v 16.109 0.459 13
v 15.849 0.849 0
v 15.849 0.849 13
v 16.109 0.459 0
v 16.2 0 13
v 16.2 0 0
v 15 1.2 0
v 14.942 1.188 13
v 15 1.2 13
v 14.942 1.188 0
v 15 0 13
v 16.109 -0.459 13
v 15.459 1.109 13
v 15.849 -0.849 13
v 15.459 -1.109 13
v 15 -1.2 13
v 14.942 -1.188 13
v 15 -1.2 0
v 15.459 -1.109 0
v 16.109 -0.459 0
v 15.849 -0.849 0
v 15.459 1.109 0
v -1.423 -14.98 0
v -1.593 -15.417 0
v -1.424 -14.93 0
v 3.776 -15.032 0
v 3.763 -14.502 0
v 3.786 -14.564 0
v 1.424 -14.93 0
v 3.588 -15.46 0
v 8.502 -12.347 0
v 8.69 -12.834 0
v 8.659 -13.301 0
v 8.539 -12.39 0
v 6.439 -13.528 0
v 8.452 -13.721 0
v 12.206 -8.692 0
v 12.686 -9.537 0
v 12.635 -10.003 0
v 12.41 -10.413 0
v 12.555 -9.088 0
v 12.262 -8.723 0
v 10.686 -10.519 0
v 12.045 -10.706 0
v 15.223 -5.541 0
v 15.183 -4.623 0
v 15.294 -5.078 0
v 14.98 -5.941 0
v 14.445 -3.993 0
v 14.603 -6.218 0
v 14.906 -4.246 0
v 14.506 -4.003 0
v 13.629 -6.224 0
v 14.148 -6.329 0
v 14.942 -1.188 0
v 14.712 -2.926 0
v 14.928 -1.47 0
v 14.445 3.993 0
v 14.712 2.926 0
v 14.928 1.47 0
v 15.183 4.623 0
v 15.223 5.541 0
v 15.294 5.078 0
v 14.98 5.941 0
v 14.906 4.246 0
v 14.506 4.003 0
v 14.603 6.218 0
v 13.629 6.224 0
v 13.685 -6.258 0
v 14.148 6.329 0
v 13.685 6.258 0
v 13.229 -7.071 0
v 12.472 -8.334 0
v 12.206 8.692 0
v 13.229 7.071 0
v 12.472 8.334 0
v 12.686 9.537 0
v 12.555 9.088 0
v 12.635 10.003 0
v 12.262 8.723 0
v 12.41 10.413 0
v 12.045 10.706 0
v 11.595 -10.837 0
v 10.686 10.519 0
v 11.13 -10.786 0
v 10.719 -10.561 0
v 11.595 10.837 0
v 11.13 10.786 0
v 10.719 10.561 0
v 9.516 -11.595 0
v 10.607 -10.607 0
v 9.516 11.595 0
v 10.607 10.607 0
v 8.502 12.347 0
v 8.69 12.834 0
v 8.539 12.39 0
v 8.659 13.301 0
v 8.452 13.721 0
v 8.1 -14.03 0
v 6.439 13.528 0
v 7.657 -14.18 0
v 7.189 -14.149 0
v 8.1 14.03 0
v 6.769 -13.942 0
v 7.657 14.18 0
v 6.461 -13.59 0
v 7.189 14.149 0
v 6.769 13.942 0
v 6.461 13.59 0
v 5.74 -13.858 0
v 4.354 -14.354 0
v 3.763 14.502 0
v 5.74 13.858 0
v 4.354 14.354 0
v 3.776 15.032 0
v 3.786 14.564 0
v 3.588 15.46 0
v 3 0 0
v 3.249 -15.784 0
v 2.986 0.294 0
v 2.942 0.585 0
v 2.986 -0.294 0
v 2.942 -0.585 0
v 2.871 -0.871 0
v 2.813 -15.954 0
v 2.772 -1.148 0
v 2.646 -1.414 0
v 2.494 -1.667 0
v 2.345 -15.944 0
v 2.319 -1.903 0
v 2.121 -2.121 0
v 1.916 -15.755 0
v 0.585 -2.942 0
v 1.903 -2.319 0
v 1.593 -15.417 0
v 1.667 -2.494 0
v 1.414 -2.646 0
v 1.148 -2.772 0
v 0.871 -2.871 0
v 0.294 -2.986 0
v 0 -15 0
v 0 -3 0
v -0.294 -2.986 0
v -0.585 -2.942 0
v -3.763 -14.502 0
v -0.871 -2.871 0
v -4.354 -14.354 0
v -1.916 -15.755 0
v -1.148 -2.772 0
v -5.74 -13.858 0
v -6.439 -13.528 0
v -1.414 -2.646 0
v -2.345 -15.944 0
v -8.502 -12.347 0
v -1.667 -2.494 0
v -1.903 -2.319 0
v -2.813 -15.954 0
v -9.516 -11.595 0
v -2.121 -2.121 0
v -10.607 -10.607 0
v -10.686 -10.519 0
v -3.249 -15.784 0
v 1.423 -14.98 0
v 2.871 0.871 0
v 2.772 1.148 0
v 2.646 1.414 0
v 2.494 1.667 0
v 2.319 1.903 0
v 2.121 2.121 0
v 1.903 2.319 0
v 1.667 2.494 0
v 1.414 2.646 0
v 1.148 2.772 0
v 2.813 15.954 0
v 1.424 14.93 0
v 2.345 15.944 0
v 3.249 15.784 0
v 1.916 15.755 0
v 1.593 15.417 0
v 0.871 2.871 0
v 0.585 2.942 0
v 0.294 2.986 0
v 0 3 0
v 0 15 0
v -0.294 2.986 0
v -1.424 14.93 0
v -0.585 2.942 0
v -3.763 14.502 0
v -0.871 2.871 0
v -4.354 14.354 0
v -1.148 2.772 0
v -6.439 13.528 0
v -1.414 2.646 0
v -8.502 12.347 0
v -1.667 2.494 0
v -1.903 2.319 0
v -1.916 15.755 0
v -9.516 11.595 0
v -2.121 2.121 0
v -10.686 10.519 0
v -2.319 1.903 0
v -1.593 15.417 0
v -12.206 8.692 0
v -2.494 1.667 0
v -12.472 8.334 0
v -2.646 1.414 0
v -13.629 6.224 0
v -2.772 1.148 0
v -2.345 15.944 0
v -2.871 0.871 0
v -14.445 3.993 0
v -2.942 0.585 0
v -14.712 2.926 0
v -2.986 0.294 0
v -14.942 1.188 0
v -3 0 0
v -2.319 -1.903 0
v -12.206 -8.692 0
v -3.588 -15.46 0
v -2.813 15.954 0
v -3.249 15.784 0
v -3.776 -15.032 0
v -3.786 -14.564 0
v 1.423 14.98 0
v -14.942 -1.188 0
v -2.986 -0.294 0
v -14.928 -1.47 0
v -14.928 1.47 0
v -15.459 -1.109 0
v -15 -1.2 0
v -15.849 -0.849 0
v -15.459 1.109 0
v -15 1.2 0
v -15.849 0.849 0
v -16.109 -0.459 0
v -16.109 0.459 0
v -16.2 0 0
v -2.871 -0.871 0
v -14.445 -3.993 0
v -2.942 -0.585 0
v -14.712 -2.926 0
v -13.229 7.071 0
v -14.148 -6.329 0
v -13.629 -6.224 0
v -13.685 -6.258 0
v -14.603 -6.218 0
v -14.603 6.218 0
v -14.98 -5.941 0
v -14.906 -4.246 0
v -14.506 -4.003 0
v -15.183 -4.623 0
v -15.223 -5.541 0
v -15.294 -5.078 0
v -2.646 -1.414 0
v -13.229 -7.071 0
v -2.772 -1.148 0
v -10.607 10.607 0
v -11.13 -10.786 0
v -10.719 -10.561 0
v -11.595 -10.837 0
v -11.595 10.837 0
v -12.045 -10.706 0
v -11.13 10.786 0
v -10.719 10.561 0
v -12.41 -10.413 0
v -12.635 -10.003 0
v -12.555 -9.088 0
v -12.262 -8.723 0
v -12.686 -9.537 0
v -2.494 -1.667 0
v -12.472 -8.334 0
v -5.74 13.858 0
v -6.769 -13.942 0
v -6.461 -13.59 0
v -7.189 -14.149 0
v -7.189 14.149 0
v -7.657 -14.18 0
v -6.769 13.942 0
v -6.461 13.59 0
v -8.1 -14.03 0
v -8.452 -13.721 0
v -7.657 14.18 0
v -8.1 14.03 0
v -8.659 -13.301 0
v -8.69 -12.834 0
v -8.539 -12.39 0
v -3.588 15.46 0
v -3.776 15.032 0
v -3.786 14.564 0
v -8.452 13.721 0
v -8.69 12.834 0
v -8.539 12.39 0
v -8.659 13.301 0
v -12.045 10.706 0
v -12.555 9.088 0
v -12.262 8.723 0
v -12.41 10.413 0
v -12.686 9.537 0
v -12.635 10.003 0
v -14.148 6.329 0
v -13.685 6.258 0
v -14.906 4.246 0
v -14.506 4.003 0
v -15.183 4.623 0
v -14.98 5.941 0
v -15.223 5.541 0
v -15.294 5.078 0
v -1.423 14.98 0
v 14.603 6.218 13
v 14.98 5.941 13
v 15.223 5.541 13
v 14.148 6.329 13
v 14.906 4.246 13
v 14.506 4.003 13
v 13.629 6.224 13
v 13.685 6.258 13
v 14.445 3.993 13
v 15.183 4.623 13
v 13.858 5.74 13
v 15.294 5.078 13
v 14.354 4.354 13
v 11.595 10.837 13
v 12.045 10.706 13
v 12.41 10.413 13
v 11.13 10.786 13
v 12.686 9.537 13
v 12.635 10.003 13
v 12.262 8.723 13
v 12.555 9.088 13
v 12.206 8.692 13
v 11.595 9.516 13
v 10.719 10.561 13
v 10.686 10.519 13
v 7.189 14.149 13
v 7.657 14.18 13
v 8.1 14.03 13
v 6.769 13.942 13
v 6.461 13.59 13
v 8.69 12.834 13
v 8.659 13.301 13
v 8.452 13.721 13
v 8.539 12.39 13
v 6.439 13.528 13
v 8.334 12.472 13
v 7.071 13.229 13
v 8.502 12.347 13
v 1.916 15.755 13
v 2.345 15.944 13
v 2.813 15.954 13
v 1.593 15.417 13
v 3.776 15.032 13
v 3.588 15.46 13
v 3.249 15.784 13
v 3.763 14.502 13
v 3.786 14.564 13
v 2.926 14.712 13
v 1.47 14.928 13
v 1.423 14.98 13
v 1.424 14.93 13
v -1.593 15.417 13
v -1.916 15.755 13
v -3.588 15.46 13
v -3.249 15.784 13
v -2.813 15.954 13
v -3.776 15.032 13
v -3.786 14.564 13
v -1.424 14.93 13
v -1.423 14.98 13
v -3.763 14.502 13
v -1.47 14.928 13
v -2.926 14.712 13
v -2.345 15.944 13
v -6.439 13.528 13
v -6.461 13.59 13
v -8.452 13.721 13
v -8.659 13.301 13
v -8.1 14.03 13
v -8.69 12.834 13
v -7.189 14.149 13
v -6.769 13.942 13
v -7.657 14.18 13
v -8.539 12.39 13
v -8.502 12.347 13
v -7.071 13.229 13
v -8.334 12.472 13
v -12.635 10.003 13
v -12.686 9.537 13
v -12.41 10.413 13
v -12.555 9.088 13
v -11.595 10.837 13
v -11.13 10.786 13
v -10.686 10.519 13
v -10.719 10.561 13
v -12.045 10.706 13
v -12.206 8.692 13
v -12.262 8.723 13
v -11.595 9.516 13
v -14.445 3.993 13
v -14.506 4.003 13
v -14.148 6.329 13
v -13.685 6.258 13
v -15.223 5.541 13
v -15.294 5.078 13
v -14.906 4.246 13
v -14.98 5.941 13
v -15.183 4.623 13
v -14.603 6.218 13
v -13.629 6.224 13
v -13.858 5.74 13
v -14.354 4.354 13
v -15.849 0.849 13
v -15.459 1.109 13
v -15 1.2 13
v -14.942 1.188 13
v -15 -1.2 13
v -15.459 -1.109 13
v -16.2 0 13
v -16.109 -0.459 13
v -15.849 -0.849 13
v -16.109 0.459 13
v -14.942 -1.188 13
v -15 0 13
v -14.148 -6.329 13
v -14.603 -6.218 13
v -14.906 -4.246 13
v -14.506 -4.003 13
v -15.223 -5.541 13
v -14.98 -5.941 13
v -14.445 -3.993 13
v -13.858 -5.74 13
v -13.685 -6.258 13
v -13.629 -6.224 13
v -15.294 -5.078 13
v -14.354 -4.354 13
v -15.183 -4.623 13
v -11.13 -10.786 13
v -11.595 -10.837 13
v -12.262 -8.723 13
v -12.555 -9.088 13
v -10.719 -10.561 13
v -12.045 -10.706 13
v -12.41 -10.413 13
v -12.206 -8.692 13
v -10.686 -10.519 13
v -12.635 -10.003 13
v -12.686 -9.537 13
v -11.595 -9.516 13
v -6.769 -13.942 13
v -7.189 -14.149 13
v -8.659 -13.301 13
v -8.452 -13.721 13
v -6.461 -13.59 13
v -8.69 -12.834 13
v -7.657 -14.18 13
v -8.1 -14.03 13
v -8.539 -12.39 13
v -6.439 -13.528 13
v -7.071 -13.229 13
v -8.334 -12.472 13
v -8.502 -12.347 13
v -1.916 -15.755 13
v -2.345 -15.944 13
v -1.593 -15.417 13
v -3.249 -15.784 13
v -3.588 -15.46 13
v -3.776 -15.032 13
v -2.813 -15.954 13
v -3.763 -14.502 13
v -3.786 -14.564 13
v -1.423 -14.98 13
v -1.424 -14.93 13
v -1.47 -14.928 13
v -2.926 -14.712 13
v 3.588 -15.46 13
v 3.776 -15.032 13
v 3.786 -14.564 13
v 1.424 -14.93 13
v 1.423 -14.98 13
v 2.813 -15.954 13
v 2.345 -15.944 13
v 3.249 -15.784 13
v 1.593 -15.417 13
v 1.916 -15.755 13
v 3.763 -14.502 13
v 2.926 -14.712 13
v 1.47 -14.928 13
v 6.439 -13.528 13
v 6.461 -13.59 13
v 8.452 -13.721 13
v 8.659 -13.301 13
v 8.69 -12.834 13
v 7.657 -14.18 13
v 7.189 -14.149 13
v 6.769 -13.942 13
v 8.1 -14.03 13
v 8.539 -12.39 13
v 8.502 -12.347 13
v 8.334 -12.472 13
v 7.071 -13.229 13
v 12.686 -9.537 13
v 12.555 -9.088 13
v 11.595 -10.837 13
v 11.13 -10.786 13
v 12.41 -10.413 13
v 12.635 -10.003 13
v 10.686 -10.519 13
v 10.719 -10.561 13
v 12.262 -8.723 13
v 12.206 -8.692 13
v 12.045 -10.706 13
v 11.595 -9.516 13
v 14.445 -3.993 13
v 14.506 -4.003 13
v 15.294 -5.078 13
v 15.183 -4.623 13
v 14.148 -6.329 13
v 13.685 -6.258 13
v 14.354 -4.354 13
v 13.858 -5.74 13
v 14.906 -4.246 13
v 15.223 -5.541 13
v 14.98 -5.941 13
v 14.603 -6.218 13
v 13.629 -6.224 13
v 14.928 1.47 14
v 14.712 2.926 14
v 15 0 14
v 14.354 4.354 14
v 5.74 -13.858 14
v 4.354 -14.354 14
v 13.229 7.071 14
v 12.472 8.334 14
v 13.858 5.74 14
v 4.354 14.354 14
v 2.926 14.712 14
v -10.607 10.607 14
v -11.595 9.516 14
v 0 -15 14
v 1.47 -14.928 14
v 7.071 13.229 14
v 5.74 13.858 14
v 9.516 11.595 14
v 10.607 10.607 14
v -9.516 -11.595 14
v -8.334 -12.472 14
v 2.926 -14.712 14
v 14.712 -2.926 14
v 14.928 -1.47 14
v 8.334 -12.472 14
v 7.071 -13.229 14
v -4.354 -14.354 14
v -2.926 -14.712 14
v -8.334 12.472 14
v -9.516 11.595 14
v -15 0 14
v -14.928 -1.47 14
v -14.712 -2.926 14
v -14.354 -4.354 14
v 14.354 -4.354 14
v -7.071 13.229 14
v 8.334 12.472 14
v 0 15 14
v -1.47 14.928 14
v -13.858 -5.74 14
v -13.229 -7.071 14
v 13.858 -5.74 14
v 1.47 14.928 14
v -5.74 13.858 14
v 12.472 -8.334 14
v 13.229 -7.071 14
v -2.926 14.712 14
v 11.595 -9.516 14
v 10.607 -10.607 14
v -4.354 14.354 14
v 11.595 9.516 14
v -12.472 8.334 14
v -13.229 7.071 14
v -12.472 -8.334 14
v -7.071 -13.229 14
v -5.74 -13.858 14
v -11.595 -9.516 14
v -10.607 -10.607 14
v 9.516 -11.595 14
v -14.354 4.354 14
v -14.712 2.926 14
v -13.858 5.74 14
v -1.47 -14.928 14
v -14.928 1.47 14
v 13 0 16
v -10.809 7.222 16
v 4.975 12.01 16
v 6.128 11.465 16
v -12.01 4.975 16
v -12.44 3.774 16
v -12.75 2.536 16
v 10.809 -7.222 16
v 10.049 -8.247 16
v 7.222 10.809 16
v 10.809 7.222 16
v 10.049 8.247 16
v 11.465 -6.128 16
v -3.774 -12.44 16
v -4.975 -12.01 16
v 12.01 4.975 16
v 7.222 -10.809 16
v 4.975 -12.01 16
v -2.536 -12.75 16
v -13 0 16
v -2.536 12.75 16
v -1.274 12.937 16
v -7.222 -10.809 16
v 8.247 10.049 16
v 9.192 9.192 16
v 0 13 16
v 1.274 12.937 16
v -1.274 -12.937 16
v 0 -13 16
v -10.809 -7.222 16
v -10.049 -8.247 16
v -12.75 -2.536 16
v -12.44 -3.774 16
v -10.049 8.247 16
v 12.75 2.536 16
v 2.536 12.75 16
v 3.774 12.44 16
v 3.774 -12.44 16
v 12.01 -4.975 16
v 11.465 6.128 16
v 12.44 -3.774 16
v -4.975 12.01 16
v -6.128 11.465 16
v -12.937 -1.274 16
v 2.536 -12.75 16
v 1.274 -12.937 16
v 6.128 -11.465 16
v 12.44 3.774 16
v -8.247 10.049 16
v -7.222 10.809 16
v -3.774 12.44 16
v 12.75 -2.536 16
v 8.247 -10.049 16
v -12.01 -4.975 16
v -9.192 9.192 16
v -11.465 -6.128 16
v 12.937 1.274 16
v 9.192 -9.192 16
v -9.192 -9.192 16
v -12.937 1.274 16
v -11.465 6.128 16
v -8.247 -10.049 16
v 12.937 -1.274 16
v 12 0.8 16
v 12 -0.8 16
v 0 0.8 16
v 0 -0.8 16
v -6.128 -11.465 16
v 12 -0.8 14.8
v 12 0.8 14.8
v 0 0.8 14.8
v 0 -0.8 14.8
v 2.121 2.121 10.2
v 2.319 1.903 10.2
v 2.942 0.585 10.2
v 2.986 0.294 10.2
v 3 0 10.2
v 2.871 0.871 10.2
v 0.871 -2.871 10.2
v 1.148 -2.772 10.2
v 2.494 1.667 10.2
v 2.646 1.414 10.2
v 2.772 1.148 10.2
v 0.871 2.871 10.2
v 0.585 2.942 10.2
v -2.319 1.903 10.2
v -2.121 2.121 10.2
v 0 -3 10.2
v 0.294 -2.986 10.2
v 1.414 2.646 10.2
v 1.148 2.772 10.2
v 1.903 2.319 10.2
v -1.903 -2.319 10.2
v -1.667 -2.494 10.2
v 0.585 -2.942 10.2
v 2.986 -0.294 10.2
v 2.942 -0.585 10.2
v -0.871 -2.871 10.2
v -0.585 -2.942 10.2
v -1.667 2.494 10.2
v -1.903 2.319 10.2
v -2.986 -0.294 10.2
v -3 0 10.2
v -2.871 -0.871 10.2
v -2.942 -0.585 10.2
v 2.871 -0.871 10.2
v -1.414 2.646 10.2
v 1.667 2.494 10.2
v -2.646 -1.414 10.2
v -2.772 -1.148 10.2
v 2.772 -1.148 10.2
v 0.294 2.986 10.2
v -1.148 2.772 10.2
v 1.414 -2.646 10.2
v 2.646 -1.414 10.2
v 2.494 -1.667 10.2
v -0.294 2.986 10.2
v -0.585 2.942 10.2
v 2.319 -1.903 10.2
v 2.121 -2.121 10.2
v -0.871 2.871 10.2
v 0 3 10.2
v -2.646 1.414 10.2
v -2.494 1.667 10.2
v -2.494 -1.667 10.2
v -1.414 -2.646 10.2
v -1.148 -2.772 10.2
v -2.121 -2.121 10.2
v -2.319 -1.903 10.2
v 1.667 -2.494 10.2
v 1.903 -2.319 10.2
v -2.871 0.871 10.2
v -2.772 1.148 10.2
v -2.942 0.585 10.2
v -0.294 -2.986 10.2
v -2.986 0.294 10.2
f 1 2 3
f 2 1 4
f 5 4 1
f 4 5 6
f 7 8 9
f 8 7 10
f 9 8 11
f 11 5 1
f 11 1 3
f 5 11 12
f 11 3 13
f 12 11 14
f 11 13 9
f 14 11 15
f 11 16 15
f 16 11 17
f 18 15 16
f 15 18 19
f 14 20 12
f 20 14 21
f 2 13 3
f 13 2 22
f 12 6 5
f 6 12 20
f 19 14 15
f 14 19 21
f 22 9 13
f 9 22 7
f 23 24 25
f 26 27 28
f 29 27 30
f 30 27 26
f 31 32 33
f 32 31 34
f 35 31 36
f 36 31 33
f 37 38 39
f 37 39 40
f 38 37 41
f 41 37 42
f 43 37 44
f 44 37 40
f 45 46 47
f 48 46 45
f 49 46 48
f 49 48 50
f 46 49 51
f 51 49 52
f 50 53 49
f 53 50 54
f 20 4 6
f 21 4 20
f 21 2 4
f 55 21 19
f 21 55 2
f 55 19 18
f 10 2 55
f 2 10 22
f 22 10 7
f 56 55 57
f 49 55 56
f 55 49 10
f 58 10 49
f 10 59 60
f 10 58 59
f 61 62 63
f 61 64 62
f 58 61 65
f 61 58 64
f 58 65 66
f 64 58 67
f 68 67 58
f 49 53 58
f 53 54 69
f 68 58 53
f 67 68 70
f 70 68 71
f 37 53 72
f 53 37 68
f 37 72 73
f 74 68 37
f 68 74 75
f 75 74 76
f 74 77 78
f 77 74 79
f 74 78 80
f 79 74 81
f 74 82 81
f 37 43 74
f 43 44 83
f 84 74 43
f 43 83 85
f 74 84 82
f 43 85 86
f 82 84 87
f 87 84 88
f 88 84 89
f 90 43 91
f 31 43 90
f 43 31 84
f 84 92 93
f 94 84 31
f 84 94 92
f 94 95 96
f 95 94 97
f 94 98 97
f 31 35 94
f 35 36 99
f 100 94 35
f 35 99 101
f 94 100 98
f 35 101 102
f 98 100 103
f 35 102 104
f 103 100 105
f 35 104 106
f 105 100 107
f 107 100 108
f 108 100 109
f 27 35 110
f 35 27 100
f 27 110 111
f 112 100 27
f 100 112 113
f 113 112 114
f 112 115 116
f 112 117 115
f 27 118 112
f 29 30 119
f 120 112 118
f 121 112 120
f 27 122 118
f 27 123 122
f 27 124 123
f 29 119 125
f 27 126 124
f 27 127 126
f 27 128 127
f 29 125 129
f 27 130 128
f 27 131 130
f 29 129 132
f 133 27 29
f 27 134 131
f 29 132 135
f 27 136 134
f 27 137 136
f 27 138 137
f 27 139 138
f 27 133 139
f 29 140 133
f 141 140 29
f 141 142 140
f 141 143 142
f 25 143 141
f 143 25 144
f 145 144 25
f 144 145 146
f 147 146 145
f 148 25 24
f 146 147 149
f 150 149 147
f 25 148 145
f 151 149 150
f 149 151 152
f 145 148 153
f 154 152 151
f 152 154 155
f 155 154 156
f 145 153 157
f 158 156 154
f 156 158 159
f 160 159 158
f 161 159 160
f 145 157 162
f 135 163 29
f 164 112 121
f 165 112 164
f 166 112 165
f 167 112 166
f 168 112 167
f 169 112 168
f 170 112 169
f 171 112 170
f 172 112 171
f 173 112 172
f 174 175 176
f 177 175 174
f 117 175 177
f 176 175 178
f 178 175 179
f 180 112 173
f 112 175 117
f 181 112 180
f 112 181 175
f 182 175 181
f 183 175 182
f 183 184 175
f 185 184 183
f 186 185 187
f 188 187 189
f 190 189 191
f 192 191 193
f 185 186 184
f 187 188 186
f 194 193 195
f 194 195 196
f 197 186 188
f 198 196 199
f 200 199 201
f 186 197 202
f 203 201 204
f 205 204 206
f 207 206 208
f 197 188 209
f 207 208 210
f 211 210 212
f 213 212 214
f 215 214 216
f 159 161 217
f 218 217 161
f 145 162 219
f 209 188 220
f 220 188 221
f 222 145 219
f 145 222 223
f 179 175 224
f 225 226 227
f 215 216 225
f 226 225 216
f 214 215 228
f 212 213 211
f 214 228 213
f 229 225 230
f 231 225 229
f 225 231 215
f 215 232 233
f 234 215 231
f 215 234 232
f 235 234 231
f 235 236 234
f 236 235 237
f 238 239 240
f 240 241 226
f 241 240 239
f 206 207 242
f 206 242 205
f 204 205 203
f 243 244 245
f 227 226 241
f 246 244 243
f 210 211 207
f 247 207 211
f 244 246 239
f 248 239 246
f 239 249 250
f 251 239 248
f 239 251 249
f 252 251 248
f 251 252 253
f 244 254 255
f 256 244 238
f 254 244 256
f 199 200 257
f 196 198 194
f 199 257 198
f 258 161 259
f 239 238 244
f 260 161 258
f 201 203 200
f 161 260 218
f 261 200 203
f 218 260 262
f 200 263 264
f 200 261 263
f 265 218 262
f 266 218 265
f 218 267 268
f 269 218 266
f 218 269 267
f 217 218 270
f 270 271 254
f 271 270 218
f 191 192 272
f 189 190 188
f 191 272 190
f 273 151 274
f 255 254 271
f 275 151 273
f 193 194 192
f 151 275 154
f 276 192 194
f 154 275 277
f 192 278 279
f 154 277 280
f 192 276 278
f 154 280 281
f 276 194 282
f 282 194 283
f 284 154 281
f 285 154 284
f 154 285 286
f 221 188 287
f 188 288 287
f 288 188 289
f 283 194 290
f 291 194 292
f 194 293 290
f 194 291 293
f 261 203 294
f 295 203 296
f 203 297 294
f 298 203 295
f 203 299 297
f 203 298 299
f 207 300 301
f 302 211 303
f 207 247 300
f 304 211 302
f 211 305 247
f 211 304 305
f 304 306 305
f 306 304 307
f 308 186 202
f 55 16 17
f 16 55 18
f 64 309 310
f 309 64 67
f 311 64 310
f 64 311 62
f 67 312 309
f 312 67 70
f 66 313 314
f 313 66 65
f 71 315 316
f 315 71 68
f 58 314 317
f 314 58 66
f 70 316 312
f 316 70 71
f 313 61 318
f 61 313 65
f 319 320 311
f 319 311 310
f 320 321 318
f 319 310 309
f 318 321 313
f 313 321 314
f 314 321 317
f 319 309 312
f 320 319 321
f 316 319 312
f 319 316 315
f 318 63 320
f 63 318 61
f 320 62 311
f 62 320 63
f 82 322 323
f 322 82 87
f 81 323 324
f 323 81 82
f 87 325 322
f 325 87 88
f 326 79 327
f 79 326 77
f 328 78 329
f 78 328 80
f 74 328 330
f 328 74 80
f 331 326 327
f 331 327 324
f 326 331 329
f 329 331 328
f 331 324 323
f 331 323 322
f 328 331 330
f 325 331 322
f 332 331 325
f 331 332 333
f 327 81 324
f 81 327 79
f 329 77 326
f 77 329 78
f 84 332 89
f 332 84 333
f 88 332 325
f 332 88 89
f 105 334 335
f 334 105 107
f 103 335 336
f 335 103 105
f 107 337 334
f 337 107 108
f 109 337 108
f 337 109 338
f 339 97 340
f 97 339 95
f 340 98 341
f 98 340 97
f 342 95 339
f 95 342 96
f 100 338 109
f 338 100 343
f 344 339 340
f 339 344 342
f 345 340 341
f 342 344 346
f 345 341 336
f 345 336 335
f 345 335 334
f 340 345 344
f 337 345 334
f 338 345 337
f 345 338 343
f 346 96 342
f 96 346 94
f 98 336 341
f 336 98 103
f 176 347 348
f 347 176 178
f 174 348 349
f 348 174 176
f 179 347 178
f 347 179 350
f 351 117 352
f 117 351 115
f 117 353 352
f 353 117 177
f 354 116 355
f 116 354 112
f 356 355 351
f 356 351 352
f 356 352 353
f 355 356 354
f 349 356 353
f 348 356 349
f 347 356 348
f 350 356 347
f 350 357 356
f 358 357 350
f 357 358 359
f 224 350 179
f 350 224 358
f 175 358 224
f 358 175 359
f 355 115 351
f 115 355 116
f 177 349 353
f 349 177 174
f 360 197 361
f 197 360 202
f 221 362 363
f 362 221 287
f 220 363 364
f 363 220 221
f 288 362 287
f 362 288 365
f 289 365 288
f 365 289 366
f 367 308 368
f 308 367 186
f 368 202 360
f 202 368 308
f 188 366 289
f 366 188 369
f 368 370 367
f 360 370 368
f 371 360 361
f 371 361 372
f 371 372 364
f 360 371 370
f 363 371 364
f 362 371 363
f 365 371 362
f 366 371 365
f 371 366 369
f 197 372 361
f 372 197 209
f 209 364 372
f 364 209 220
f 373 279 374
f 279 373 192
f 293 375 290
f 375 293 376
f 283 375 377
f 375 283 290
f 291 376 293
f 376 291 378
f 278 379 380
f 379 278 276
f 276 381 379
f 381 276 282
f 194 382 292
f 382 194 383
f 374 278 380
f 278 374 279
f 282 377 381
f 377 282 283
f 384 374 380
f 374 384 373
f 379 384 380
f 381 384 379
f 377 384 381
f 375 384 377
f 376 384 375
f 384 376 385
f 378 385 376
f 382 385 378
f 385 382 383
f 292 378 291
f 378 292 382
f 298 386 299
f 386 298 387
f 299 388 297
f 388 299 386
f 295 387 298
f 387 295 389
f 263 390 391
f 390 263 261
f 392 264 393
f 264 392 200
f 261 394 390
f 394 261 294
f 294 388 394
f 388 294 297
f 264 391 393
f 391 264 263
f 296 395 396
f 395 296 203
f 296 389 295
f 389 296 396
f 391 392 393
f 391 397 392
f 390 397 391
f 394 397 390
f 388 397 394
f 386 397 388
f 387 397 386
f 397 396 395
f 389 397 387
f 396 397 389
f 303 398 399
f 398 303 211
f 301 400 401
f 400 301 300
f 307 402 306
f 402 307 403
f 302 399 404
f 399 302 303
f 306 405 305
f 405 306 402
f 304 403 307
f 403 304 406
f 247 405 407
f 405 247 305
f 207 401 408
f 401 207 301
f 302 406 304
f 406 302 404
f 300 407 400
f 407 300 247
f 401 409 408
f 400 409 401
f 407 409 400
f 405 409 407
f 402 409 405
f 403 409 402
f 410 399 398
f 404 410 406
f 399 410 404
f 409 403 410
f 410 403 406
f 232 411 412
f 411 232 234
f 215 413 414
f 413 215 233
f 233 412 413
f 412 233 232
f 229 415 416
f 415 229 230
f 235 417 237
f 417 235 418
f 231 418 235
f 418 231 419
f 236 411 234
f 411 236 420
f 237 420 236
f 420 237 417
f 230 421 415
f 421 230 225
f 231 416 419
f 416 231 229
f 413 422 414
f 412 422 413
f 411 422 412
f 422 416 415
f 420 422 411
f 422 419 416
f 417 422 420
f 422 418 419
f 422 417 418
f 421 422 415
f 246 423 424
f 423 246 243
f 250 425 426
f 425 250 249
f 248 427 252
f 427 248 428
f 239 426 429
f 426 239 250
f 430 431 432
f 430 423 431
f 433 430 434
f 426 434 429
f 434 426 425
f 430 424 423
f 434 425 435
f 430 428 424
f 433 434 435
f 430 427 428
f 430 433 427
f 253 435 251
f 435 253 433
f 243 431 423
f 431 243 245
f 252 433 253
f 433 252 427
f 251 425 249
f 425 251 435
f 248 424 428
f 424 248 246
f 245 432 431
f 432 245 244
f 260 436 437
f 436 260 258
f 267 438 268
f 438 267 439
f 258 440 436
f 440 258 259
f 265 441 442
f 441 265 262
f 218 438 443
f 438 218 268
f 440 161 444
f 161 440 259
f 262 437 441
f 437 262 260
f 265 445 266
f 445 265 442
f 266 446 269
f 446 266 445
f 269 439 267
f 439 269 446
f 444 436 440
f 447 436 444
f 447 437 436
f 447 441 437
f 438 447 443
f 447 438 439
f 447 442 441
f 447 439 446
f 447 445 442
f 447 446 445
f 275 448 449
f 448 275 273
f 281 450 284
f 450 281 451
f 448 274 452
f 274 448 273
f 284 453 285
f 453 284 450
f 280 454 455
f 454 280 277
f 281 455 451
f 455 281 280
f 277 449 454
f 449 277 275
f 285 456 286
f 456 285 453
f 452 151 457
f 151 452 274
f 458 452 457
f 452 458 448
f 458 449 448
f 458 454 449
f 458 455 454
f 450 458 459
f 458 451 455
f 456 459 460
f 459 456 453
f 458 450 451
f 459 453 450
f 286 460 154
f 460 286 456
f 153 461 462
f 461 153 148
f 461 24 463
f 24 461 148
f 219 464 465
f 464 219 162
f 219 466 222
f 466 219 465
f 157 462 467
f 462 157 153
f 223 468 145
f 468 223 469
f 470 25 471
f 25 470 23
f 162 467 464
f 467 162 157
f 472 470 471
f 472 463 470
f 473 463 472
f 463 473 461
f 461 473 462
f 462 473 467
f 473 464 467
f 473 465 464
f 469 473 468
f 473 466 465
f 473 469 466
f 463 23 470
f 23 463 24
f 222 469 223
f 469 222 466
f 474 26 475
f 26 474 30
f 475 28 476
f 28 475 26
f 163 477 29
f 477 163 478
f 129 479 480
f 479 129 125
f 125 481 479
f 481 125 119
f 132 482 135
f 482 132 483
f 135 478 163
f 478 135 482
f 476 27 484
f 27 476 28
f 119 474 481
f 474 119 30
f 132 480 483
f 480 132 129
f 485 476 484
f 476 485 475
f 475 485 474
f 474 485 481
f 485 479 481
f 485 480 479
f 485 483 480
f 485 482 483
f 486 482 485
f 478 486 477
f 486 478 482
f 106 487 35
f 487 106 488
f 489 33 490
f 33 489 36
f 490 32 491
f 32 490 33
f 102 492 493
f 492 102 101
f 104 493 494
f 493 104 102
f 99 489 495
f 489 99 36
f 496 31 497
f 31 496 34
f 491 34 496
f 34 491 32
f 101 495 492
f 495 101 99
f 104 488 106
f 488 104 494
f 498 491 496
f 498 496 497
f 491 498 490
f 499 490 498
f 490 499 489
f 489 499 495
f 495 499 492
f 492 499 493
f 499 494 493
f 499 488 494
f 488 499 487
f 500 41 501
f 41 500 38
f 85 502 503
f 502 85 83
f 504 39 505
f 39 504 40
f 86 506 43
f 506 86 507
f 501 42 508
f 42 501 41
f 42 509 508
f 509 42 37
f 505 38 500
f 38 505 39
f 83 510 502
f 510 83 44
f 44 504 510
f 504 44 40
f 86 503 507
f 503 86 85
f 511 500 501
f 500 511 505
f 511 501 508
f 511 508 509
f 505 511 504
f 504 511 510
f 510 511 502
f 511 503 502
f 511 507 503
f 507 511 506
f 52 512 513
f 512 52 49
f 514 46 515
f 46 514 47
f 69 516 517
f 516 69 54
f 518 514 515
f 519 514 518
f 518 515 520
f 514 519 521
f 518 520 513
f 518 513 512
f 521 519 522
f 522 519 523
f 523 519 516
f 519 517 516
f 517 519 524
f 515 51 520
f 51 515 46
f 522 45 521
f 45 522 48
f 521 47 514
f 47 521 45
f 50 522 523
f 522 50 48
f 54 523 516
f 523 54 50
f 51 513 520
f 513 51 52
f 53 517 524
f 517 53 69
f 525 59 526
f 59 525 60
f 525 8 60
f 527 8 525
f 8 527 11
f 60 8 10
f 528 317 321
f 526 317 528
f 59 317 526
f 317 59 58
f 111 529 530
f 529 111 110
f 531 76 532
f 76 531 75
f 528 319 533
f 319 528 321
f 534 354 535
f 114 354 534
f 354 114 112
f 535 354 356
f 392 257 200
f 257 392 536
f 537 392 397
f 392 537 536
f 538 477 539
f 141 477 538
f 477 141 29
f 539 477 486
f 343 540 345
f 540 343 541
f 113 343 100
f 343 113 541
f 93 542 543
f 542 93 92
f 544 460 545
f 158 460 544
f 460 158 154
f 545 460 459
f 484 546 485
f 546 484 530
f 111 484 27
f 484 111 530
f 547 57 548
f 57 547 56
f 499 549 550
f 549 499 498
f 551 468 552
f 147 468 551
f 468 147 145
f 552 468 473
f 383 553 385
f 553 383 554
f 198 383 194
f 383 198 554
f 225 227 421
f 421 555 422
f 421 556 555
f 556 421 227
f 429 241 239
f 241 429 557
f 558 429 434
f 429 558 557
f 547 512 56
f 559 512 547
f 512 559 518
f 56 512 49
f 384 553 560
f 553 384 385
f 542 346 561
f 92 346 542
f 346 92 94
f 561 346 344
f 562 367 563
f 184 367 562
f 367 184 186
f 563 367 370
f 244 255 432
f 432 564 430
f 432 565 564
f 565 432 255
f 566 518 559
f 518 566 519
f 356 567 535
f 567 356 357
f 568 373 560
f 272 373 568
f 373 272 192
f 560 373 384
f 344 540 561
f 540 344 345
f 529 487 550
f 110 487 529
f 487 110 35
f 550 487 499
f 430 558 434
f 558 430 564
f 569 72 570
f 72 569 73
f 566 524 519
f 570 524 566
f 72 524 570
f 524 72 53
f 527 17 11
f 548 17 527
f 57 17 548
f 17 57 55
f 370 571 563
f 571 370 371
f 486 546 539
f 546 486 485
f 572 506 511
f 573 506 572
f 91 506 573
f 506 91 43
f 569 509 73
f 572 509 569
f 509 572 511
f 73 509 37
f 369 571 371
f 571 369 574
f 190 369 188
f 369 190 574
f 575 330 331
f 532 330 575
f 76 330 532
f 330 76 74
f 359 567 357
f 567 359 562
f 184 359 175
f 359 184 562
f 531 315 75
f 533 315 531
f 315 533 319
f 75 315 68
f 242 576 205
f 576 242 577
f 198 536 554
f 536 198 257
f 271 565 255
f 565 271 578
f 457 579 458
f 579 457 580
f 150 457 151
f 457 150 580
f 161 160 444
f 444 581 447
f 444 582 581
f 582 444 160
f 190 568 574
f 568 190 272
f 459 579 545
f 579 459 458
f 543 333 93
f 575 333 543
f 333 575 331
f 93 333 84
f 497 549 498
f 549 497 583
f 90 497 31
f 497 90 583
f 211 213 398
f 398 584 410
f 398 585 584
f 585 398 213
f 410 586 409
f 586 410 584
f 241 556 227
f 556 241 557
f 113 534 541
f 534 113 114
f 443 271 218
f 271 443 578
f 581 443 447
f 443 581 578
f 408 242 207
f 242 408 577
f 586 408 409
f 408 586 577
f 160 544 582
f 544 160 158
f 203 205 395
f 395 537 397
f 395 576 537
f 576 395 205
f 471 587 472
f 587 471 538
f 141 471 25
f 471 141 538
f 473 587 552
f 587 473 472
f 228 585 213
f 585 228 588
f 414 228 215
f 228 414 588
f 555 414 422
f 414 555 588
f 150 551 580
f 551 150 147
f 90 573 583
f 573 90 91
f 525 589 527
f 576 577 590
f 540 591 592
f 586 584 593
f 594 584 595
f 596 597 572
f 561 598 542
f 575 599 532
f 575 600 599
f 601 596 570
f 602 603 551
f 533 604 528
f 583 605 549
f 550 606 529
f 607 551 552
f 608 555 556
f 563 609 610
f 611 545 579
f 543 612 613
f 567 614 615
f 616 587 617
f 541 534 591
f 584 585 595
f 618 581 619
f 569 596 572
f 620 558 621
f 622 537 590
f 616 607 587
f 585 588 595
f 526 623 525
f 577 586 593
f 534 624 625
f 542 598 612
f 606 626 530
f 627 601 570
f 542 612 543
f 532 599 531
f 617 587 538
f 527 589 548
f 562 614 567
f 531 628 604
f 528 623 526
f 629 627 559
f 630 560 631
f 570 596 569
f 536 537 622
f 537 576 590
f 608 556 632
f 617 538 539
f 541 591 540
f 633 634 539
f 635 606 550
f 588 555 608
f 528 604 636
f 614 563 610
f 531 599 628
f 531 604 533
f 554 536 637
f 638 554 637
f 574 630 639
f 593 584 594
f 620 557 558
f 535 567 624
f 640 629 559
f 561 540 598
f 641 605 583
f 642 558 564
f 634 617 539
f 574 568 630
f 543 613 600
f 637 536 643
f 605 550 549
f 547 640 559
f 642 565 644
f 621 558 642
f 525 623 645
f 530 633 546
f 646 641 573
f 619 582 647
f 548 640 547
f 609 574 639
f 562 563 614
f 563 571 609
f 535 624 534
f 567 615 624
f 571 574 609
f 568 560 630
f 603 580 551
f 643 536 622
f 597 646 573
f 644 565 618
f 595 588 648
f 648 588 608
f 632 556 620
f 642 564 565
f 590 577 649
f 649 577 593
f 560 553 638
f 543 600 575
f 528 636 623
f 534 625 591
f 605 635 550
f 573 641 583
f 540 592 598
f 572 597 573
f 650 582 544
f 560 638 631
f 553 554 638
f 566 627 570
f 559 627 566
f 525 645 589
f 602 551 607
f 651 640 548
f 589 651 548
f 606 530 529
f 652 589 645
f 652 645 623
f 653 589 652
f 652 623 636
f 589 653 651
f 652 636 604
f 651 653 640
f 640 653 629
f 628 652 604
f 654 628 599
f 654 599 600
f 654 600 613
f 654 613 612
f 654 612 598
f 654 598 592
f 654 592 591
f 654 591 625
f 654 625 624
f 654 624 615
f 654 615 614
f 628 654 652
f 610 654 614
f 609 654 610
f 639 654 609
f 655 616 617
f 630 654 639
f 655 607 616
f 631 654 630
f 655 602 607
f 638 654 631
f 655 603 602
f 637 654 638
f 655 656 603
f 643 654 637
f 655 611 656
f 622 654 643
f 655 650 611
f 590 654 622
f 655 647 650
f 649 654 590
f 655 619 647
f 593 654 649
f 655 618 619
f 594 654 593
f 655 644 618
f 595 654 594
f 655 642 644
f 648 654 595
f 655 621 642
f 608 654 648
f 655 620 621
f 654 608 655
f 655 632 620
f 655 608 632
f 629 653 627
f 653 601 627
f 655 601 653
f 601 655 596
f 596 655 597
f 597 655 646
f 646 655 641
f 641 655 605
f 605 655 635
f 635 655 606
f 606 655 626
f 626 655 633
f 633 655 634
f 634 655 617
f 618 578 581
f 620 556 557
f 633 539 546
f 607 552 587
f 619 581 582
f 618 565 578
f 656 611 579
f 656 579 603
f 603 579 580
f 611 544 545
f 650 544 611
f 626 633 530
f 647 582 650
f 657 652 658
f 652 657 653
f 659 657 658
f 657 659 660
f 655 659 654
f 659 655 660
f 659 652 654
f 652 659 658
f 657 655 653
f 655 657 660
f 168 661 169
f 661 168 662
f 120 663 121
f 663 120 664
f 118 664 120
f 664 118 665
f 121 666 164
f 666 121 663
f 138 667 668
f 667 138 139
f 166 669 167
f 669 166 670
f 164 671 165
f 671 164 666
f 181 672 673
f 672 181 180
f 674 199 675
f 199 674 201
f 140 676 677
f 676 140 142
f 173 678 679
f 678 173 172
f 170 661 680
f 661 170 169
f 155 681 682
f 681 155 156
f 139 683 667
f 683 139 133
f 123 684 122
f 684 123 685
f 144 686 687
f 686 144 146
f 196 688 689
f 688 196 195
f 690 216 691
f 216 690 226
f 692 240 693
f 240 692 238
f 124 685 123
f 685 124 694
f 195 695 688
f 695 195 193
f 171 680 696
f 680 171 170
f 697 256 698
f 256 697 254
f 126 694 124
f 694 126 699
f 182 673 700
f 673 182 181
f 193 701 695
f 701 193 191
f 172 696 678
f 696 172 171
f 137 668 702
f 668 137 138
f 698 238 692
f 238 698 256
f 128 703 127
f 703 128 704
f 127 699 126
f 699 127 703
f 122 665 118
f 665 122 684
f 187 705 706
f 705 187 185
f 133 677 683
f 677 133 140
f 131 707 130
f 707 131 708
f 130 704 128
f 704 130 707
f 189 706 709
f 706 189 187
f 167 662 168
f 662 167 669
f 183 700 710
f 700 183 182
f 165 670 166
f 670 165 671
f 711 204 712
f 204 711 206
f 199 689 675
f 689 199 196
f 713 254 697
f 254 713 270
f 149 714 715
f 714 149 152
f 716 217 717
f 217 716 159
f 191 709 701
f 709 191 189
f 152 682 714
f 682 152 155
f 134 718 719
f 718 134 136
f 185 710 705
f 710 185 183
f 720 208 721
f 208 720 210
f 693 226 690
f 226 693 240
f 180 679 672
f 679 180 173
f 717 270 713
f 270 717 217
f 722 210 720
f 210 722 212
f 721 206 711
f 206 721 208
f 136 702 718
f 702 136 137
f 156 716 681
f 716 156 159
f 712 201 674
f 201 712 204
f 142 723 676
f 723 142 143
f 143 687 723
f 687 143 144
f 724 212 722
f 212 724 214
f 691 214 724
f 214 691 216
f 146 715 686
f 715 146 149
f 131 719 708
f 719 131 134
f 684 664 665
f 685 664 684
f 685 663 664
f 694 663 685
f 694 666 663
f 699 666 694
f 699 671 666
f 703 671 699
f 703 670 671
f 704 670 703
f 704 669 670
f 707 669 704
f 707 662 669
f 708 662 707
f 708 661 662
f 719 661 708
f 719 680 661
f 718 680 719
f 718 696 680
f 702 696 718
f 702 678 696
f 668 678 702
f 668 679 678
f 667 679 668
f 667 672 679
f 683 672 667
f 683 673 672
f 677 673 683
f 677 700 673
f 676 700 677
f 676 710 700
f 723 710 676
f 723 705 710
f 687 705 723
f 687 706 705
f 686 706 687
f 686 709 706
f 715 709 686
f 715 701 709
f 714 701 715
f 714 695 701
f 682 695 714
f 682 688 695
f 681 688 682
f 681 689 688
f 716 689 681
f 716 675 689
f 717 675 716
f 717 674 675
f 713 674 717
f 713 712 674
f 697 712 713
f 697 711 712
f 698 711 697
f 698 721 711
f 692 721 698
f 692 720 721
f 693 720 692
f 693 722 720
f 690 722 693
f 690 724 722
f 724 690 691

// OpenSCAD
// A rotary control knob: the model of the chapter "Embedding Pictures in Markdown" (original, MIT).
// The variables can be overridden with define-NAME attributes.
$fn = 64;

diameter = 30;  // outer diameter of the knob
height = 16;    // height of the knob
ridges = 18;    // number of grip ridges around the side
shaft = 6;      // diameter of the shaft hole

module knob() {
    difference() {
        union() {
            // The body, with a rounded-off top edge
            cylinder(h = height - 2, d = diameter);
            translate([0, 0, height - 2]) cylinder(h = 2, d1 = diameter, d2 = diameter - 4);
            // The grip ridges around the side
            for (i = [0 : ridges - 1])
                rotate([0, 0, i * 360 / ridges])
                    translate([diameter / 2, 0, 0]) cylinder(h = height - 3, d = 2.4, $fn = 16);
        }
        // The pointer line on the top, and the shaft hole underneath
        translate([0, -0.8, height - 1.2]) cube([diameter / 2 - 3, 1.6, 2]);
        translate([0, 0, -1]) cylinder(h = height * 0.7, d = shaft);
    }
}

knob();
